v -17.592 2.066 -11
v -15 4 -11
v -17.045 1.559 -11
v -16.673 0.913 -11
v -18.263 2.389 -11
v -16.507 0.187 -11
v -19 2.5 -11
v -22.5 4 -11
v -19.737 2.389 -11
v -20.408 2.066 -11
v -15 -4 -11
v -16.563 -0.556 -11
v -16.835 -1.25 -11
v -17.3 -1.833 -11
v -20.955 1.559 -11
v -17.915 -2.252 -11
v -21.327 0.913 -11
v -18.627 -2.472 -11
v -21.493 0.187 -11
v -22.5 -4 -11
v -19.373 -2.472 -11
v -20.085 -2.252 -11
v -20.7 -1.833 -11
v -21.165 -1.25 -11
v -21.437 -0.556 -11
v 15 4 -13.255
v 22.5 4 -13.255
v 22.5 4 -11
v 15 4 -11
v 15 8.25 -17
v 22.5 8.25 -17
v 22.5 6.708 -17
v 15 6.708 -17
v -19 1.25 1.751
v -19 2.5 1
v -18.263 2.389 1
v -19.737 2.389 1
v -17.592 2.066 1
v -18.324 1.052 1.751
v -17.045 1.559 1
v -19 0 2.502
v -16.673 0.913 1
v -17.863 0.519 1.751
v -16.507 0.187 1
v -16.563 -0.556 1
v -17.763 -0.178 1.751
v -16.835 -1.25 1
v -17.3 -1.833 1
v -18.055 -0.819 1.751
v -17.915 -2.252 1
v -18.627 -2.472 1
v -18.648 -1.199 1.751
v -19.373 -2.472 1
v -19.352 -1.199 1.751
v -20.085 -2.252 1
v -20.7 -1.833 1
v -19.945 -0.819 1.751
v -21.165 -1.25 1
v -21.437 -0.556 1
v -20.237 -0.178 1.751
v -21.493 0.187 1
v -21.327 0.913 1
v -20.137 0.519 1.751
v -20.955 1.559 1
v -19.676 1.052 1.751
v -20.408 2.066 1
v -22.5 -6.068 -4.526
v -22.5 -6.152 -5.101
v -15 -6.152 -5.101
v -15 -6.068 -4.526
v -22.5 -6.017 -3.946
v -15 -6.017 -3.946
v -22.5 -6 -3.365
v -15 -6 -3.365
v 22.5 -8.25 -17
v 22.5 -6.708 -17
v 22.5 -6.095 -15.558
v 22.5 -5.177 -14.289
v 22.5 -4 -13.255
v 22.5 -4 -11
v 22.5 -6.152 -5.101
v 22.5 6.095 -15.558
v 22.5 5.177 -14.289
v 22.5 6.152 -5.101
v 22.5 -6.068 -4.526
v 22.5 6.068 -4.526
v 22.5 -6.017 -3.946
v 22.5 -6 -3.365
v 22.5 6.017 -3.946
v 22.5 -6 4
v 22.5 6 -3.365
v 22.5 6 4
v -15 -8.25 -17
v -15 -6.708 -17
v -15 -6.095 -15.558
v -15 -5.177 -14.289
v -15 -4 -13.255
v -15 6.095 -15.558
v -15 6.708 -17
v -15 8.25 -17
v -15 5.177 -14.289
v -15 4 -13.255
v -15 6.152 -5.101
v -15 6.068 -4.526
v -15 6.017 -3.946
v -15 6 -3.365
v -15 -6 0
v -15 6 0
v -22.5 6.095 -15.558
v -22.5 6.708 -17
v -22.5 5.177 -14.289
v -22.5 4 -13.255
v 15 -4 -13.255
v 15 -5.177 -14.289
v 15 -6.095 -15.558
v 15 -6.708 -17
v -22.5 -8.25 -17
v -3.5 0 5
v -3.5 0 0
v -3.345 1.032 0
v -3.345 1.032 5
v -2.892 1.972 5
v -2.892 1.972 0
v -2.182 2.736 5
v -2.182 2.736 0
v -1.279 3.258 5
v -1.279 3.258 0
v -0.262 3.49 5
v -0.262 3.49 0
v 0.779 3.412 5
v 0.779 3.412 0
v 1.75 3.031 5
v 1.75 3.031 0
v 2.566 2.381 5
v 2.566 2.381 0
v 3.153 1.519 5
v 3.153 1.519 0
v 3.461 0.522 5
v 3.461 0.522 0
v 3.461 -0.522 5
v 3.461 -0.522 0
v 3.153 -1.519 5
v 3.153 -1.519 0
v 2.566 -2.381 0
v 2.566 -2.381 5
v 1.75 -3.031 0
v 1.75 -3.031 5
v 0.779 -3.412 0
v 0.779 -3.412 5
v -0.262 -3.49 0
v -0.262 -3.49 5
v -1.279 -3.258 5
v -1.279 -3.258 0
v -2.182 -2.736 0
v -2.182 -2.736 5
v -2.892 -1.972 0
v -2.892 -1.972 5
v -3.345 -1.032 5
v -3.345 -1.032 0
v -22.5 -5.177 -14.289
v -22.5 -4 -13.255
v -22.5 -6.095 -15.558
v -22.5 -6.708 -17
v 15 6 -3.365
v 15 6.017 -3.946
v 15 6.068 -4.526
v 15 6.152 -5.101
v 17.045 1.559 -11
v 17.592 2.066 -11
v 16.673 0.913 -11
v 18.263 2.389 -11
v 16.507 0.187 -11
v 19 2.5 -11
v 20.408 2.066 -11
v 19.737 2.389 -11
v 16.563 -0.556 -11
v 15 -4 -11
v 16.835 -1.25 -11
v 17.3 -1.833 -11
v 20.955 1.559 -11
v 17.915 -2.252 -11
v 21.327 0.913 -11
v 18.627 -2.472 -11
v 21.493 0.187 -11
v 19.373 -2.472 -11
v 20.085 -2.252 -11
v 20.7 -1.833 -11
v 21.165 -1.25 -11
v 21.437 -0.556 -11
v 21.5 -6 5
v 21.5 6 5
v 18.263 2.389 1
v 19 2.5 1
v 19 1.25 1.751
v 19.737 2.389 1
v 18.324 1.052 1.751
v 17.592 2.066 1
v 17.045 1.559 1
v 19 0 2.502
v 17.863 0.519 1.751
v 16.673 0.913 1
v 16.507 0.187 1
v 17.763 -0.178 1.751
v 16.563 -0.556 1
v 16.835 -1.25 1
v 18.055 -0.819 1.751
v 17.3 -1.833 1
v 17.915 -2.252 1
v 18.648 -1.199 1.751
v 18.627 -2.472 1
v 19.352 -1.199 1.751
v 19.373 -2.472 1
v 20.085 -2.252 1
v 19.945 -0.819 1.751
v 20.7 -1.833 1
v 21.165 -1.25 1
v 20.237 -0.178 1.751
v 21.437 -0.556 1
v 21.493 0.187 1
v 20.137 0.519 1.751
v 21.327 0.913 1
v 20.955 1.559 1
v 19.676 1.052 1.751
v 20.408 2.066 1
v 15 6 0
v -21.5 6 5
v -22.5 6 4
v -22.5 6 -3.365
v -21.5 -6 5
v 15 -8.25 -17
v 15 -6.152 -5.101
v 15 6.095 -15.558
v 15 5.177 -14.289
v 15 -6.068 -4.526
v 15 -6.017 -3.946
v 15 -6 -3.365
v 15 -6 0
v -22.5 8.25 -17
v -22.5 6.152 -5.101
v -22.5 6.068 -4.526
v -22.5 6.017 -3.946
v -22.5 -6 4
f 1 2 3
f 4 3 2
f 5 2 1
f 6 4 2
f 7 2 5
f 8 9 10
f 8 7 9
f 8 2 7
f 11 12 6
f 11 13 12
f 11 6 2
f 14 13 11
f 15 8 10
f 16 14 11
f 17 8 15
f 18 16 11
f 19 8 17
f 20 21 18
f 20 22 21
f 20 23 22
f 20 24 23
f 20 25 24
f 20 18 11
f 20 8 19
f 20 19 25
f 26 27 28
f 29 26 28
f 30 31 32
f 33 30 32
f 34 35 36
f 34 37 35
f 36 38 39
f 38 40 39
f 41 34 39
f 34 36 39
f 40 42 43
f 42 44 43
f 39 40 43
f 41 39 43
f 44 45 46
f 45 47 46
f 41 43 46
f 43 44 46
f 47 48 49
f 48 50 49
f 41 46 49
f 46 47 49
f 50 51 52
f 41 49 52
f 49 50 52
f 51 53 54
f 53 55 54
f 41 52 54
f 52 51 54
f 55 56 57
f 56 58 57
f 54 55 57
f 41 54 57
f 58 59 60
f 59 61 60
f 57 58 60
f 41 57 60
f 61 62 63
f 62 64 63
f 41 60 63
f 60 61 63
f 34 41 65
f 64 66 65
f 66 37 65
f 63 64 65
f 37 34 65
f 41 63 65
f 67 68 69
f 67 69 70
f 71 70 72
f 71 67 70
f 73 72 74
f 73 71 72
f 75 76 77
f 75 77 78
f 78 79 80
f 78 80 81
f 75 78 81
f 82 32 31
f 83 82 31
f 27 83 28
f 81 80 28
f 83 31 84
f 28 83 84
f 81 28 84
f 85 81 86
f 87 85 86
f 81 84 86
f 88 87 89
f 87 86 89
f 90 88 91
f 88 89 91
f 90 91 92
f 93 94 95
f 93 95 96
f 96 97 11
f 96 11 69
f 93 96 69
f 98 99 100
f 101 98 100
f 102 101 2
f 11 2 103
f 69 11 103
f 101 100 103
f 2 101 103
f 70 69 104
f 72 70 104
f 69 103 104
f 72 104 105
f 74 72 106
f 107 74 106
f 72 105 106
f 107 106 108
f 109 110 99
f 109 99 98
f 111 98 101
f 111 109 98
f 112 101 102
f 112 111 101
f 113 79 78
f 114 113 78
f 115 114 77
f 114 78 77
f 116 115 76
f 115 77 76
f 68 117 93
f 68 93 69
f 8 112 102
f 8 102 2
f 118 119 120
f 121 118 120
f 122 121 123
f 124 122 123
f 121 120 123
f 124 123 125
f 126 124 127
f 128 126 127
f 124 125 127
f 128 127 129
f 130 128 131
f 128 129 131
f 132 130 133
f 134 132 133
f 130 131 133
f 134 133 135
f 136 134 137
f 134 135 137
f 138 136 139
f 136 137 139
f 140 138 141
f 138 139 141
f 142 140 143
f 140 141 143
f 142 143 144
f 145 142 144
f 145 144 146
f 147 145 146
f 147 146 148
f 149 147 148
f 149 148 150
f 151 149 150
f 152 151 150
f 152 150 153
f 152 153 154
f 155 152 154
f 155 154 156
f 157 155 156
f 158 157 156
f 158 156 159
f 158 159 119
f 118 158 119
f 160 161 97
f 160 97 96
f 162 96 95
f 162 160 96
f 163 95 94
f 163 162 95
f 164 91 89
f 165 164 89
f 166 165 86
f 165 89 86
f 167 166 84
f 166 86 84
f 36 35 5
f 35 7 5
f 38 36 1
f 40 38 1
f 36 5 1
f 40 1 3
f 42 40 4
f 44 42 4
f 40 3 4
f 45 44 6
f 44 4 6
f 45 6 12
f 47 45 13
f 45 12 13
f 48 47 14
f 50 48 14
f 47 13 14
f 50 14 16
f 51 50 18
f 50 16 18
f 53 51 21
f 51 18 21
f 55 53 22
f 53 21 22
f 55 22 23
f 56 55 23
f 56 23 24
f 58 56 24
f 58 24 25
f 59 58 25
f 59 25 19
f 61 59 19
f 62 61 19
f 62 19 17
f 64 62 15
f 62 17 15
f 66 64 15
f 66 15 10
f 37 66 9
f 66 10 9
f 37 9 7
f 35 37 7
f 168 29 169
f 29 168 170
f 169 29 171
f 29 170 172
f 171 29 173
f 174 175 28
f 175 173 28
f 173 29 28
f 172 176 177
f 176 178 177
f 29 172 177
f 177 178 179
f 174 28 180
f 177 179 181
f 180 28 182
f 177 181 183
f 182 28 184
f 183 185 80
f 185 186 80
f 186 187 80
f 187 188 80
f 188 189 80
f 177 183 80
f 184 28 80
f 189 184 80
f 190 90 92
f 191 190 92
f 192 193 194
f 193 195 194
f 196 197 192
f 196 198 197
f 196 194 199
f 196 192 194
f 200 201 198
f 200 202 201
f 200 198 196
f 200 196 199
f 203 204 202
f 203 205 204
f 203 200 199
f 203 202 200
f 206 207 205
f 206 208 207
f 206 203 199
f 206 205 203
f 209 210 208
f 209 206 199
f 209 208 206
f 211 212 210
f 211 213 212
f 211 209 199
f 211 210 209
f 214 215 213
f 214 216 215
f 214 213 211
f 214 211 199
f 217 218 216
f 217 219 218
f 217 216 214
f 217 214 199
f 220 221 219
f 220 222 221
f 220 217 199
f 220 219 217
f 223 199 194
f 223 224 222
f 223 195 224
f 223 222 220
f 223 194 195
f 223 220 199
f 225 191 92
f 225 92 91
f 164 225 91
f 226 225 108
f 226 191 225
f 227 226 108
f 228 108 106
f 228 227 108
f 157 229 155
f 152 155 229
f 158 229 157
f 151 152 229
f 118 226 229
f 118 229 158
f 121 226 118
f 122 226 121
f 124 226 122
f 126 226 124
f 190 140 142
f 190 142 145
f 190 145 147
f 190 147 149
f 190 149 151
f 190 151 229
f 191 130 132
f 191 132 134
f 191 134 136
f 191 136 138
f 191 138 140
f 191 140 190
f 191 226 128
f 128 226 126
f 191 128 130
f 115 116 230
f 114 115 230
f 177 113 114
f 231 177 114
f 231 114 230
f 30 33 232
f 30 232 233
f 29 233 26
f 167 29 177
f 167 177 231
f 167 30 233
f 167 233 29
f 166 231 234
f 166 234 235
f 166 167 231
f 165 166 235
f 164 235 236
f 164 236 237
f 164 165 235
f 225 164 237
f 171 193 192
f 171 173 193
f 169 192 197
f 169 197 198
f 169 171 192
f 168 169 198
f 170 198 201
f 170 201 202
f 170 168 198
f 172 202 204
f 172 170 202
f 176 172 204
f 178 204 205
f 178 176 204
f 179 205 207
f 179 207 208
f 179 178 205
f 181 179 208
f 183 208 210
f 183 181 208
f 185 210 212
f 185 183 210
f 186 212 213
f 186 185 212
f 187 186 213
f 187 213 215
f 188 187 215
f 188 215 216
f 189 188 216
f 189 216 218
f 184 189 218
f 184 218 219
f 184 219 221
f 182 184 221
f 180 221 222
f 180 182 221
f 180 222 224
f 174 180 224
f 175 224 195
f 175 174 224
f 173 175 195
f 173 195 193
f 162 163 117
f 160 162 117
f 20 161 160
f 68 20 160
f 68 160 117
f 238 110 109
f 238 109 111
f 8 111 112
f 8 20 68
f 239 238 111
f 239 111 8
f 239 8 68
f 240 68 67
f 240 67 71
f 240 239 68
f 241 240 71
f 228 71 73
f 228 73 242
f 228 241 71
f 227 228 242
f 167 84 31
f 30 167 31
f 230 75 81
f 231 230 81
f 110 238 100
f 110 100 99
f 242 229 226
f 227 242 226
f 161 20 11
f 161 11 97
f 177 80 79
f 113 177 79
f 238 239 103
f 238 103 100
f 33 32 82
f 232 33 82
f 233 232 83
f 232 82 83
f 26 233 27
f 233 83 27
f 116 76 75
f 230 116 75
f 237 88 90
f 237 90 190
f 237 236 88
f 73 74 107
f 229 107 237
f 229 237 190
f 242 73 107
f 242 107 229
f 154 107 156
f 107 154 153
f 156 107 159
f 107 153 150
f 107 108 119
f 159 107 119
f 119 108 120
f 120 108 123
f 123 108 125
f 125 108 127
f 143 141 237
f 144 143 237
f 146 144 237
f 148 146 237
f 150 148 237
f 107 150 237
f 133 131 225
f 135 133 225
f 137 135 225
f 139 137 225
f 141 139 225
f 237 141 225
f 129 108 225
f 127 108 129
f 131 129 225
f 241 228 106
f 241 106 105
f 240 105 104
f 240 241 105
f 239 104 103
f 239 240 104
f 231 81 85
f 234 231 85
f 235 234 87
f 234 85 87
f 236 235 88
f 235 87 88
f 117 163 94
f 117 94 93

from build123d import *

# Parameters (mm, degrees)
SKETCH_1_W          = 45
SKETCH_1_H          = 12
EXTRUDE_1_DEPTH     = 5
EXTRUDE_2_DEPTH     = 7.5
SKETCH_9_R          = 3.5
CUT_EXTRUDE_1_DEPTH = 30.382179974
CHAMFER_1_SIZE      = 1


with BuildPart() as part:
    # 草图1 → 凸台-拉伸1 (new body)
    with BuildSketch(Plane.XY):
        Rectangle(SKETCH_1_W, SKETCH_1_H)
    extrude(amount=EXTRUDE_1_DEPTH)

    # 草图4 → 凸台-拉伸2 (add)
    with BuildSketch(Plane(origin=(22.5, 0, 0), x_dir=(0, 0, -1), z_dir=(1, 0, 0))):
        with BuildLine():
            Line((0, 6), (3.364729271, 6))
            ThreePointArc((3.364729271, 6), (4.236286698, 6.038053019), (5.101211047, 6.15192247))
            Line((5.101211047, 6.15192247), (17, 8.25))
            Line((17, 8.25), (17, 6.708203932))
            ThreePointArc((17, 6.708203932), (14.8977866, 5.672023027), (13.255437353, 4))
            Line((13.255437353, 4), (11, 4))
            Line((11, 4), (11, -4))
            Line((11, -4), (13.255437353, -4))
            ThreePointArc((13.255437353, -4), (14.8977866, -5.672023027), (17, -6.708203932))
            Line((17, -6.708203932), (17, -8.25))
            Line((17, -8.25), (5.101211047, -6.15192247))
            ThreePointArc((5.101211047, -6.15192247), (4.236286698, -6.038053019), (3.364729271, -6))
            Line((3.364729271, -6), (0, -6))
            Line((0, -6), (0, 6))
        make_face()
    extrude_2 = extrude(amount=-EXTRUDE_2_DEPTH)

    # 镜向1: 凸台-拉伸2 across plane
    add(extrude_2.mirror(Plane(origin=(0, 0, 0), x_dir=(0, 0, 1), z_dir=(1, 0, 0))))

    # 草图9 → 切除-拉伸1 (cut, through all)
    with BuildSketch(Plane(origin=(0, 0, 0), x_dir=(-1, 0, 0), z_dir=(0, 0, -1))):
        Circle(SKETCH_9_R)
    extrude(amount=-CUT_EXTRUDE_1_DEPTH, mode=Mode.SUBTRACT)

    # 草图12 → M6 螺纹孔1 (revolve, cut)
    with BuildSketch(Plane(origin=(19, 0, -11), x_dir=(0, 1, 0), z_dir=(1, 0, 0))):
        Polygon((0, 0), (0, 13.502151548), (2.5, 12), (2.5, 0), align=None)
    hole_wizard_m6_1 = revolve(axis=Axis((19, 0, -17.35), (0, 0, 1)), mode=Mode.SUBTRACT)

    # 镜向2: M6 螺纹孔1 across plane
    add(hole_wizard_m6_1.mirror(Plane(origin=(0, 0, 0), x_dir=(0, 0, 1), z_dir=(1, 0, 0))), mode=Mode.SUBTRACT)

    # 倒角1
    chamfer_1_edges = [part.edges().sort_by_distance(p)[0] for p in [
        (-22.5, 0, 5),
        (22.5, 0, 5),
    ]]
    chamfer(chamfer_1_edges, length=CHAMFER_1_SIZE)


solid = part.part
